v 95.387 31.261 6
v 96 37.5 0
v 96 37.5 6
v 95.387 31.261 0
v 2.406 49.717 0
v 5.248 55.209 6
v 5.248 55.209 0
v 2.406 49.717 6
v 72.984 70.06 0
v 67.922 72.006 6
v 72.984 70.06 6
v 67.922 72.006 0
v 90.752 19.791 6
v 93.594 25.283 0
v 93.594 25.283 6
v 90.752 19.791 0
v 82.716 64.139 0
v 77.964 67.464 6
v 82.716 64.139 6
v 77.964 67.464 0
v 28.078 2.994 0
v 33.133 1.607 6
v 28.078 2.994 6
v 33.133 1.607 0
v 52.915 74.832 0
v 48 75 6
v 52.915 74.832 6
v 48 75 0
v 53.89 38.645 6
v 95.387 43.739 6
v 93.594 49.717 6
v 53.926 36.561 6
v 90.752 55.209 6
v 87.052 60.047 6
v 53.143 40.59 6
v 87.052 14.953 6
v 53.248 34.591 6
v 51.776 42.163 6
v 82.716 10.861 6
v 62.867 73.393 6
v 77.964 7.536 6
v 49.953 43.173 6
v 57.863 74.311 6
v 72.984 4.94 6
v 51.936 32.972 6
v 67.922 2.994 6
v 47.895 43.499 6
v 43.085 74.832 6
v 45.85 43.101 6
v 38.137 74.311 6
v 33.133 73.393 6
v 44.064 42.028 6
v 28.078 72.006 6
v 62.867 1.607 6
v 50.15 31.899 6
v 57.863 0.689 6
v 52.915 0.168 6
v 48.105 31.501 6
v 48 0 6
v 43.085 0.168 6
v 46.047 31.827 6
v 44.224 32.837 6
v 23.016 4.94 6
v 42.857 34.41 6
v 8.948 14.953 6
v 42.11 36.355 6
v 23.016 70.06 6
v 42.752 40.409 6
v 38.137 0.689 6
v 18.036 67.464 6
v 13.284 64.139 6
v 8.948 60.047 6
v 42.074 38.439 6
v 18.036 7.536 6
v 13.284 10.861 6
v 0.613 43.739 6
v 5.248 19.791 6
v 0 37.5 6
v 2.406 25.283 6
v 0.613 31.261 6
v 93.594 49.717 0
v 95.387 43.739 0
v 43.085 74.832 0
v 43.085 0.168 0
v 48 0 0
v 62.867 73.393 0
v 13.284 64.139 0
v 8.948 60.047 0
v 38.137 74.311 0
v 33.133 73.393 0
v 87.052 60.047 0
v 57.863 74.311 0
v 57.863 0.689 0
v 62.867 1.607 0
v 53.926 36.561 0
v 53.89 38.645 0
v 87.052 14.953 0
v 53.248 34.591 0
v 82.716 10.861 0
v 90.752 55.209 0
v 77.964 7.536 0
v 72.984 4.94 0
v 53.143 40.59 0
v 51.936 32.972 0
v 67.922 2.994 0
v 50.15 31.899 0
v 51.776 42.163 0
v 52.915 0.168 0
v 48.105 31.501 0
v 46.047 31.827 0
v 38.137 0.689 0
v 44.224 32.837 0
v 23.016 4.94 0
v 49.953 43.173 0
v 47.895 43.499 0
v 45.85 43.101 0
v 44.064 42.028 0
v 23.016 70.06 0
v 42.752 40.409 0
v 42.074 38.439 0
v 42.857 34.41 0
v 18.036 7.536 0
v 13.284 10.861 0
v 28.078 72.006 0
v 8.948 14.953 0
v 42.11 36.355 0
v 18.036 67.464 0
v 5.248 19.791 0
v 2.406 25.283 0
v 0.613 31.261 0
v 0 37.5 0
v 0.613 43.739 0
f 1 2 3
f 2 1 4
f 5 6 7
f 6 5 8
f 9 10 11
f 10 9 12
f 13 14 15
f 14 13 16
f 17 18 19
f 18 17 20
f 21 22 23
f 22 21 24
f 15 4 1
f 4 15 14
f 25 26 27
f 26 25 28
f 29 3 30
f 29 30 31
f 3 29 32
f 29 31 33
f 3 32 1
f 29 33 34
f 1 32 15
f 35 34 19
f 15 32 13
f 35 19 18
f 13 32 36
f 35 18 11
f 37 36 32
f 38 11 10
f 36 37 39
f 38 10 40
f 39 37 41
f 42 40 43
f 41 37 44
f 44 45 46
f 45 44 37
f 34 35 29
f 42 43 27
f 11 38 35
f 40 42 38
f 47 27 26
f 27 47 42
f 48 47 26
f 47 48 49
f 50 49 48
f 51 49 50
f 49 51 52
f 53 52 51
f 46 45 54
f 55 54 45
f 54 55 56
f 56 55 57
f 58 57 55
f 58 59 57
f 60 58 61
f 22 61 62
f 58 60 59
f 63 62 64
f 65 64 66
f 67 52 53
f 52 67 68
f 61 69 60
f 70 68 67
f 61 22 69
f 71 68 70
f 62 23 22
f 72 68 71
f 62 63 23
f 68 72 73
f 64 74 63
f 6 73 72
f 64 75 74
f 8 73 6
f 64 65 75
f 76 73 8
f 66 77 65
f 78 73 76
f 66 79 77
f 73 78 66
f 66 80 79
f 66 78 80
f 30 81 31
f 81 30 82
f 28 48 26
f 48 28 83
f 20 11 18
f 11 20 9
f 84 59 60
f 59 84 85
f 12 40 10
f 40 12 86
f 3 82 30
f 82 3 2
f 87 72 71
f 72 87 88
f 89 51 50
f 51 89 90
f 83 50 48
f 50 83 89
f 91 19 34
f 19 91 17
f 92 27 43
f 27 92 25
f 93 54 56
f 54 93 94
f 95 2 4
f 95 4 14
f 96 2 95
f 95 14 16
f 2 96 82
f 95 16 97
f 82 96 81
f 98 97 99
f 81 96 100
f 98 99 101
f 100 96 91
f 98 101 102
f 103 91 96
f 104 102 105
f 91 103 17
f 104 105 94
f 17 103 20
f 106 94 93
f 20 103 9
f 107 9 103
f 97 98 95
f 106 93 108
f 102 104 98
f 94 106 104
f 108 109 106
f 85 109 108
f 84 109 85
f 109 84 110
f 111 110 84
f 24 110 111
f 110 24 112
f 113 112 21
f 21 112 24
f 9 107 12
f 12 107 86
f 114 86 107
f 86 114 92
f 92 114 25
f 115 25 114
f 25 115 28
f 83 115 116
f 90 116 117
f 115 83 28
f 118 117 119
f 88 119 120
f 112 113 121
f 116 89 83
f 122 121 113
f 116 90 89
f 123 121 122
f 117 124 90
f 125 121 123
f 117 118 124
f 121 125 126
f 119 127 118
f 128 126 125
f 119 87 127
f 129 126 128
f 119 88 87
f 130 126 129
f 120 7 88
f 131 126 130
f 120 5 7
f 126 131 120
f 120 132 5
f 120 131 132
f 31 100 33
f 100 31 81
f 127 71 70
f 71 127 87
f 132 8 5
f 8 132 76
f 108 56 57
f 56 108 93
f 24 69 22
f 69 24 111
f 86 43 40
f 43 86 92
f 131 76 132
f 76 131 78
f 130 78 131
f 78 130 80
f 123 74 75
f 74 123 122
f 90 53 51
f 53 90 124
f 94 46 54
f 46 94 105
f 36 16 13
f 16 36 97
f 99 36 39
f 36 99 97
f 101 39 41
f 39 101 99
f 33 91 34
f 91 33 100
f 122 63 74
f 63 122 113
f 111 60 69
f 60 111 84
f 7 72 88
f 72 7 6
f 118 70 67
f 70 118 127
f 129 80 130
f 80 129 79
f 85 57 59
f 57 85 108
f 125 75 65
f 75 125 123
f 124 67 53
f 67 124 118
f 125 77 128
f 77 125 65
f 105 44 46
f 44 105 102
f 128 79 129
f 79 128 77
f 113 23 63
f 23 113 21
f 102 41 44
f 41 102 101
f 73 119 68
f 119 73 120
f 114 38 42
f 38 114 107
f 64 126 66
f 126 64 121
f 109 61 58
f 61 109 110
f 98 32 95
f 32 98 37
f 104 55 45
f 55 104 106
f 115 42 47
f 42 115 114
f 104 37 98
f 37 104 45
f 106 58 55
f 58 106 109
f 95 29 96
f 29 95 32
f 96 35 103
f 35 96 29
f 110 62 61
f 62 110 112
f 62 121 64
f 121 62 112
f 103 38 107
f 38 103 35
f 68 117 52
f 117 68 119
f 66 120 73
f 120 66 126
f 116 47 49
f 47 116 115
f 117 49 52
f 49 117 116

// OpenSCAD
$fn = 32;

// ----------------------------------------------------------------------
// Cam plate: double_lobe cam, base R36
// ----------------------------------------------------------------------

// --- parameters (mm) ---
base_r = 36;              // base circle radius
lobe_h = 12;              // cam lobe rise
bore_r = 6;               // shaft bore radius
plate_t = 6;              // plate thickness, Z (extrusion height)

profile = [[96, 37.5], [95.387, 43.739], [93.594, 49.717], [90.752, 55.209], [87.052, 60.047], [82.716, 64.139], [77.964, 67.464], [72.984, 70.06], [67.922, 72.006], [62.867, 73.393], [57.863, 74.311], [52.915, 74.832], [48, 75], [43.085, 74.832], [38.137, 74.311], [33.133, 73.393], [28.078, 72.006], [23.016, 70.06], [18.036, 67.464], [13.284, 64.139], [8.948, 60.047], [5.248, 55.209], [2.406, 49.717], [0.613, 43.739], [0, 37.5], [0.613, 31.261], [2.406, 25.283], [5.248, 19.791], [8.948, 14.953], [13.284, 10.861], [18.036, 7.536], [23.016, 4.94], [28.078, 2.994], [33.133, 1.607], [38.137, 0.689], [43.085, 0.168], [48, 0], [52.915, 0.168], [57.863, 0.689], [62.867, 1.607], [67.922, 2.994], [72.984, 4.94], [77.964, 7.536], [82.716, 10.861], [87.052, 14.953], [90.752, 19.791], [93.594, 25.283], [95.387, 31.261]];  // primary outline, 48 points, counter clockwise
void_1 = [[53.89, 38.645], [53.143, 40.59], [51.776, 42.163], [49.953, 43.173], [47.895, 43.499], [45.85, 43.101], [44.064, 42.028], [42.752, 40.409], [42.074, 38.439], [42.11, 36.355], [42.857, 34.41], [44.224, 32.837], [46.047, 31.827], [48.105, 31.501], [50.15, 31.899], [51.936, 32.972], [53.248, 34.591], [53.926, 36.561]];  // shaft bore, 18 points

// --- the one profile operation ---
difference() {
  linear_extrude(height = plate_t) polygon(points = profile);
  translate([0, 0, -1])
    linear_extrude(height = plate_t + 2) polygon(points = void_1);
}
